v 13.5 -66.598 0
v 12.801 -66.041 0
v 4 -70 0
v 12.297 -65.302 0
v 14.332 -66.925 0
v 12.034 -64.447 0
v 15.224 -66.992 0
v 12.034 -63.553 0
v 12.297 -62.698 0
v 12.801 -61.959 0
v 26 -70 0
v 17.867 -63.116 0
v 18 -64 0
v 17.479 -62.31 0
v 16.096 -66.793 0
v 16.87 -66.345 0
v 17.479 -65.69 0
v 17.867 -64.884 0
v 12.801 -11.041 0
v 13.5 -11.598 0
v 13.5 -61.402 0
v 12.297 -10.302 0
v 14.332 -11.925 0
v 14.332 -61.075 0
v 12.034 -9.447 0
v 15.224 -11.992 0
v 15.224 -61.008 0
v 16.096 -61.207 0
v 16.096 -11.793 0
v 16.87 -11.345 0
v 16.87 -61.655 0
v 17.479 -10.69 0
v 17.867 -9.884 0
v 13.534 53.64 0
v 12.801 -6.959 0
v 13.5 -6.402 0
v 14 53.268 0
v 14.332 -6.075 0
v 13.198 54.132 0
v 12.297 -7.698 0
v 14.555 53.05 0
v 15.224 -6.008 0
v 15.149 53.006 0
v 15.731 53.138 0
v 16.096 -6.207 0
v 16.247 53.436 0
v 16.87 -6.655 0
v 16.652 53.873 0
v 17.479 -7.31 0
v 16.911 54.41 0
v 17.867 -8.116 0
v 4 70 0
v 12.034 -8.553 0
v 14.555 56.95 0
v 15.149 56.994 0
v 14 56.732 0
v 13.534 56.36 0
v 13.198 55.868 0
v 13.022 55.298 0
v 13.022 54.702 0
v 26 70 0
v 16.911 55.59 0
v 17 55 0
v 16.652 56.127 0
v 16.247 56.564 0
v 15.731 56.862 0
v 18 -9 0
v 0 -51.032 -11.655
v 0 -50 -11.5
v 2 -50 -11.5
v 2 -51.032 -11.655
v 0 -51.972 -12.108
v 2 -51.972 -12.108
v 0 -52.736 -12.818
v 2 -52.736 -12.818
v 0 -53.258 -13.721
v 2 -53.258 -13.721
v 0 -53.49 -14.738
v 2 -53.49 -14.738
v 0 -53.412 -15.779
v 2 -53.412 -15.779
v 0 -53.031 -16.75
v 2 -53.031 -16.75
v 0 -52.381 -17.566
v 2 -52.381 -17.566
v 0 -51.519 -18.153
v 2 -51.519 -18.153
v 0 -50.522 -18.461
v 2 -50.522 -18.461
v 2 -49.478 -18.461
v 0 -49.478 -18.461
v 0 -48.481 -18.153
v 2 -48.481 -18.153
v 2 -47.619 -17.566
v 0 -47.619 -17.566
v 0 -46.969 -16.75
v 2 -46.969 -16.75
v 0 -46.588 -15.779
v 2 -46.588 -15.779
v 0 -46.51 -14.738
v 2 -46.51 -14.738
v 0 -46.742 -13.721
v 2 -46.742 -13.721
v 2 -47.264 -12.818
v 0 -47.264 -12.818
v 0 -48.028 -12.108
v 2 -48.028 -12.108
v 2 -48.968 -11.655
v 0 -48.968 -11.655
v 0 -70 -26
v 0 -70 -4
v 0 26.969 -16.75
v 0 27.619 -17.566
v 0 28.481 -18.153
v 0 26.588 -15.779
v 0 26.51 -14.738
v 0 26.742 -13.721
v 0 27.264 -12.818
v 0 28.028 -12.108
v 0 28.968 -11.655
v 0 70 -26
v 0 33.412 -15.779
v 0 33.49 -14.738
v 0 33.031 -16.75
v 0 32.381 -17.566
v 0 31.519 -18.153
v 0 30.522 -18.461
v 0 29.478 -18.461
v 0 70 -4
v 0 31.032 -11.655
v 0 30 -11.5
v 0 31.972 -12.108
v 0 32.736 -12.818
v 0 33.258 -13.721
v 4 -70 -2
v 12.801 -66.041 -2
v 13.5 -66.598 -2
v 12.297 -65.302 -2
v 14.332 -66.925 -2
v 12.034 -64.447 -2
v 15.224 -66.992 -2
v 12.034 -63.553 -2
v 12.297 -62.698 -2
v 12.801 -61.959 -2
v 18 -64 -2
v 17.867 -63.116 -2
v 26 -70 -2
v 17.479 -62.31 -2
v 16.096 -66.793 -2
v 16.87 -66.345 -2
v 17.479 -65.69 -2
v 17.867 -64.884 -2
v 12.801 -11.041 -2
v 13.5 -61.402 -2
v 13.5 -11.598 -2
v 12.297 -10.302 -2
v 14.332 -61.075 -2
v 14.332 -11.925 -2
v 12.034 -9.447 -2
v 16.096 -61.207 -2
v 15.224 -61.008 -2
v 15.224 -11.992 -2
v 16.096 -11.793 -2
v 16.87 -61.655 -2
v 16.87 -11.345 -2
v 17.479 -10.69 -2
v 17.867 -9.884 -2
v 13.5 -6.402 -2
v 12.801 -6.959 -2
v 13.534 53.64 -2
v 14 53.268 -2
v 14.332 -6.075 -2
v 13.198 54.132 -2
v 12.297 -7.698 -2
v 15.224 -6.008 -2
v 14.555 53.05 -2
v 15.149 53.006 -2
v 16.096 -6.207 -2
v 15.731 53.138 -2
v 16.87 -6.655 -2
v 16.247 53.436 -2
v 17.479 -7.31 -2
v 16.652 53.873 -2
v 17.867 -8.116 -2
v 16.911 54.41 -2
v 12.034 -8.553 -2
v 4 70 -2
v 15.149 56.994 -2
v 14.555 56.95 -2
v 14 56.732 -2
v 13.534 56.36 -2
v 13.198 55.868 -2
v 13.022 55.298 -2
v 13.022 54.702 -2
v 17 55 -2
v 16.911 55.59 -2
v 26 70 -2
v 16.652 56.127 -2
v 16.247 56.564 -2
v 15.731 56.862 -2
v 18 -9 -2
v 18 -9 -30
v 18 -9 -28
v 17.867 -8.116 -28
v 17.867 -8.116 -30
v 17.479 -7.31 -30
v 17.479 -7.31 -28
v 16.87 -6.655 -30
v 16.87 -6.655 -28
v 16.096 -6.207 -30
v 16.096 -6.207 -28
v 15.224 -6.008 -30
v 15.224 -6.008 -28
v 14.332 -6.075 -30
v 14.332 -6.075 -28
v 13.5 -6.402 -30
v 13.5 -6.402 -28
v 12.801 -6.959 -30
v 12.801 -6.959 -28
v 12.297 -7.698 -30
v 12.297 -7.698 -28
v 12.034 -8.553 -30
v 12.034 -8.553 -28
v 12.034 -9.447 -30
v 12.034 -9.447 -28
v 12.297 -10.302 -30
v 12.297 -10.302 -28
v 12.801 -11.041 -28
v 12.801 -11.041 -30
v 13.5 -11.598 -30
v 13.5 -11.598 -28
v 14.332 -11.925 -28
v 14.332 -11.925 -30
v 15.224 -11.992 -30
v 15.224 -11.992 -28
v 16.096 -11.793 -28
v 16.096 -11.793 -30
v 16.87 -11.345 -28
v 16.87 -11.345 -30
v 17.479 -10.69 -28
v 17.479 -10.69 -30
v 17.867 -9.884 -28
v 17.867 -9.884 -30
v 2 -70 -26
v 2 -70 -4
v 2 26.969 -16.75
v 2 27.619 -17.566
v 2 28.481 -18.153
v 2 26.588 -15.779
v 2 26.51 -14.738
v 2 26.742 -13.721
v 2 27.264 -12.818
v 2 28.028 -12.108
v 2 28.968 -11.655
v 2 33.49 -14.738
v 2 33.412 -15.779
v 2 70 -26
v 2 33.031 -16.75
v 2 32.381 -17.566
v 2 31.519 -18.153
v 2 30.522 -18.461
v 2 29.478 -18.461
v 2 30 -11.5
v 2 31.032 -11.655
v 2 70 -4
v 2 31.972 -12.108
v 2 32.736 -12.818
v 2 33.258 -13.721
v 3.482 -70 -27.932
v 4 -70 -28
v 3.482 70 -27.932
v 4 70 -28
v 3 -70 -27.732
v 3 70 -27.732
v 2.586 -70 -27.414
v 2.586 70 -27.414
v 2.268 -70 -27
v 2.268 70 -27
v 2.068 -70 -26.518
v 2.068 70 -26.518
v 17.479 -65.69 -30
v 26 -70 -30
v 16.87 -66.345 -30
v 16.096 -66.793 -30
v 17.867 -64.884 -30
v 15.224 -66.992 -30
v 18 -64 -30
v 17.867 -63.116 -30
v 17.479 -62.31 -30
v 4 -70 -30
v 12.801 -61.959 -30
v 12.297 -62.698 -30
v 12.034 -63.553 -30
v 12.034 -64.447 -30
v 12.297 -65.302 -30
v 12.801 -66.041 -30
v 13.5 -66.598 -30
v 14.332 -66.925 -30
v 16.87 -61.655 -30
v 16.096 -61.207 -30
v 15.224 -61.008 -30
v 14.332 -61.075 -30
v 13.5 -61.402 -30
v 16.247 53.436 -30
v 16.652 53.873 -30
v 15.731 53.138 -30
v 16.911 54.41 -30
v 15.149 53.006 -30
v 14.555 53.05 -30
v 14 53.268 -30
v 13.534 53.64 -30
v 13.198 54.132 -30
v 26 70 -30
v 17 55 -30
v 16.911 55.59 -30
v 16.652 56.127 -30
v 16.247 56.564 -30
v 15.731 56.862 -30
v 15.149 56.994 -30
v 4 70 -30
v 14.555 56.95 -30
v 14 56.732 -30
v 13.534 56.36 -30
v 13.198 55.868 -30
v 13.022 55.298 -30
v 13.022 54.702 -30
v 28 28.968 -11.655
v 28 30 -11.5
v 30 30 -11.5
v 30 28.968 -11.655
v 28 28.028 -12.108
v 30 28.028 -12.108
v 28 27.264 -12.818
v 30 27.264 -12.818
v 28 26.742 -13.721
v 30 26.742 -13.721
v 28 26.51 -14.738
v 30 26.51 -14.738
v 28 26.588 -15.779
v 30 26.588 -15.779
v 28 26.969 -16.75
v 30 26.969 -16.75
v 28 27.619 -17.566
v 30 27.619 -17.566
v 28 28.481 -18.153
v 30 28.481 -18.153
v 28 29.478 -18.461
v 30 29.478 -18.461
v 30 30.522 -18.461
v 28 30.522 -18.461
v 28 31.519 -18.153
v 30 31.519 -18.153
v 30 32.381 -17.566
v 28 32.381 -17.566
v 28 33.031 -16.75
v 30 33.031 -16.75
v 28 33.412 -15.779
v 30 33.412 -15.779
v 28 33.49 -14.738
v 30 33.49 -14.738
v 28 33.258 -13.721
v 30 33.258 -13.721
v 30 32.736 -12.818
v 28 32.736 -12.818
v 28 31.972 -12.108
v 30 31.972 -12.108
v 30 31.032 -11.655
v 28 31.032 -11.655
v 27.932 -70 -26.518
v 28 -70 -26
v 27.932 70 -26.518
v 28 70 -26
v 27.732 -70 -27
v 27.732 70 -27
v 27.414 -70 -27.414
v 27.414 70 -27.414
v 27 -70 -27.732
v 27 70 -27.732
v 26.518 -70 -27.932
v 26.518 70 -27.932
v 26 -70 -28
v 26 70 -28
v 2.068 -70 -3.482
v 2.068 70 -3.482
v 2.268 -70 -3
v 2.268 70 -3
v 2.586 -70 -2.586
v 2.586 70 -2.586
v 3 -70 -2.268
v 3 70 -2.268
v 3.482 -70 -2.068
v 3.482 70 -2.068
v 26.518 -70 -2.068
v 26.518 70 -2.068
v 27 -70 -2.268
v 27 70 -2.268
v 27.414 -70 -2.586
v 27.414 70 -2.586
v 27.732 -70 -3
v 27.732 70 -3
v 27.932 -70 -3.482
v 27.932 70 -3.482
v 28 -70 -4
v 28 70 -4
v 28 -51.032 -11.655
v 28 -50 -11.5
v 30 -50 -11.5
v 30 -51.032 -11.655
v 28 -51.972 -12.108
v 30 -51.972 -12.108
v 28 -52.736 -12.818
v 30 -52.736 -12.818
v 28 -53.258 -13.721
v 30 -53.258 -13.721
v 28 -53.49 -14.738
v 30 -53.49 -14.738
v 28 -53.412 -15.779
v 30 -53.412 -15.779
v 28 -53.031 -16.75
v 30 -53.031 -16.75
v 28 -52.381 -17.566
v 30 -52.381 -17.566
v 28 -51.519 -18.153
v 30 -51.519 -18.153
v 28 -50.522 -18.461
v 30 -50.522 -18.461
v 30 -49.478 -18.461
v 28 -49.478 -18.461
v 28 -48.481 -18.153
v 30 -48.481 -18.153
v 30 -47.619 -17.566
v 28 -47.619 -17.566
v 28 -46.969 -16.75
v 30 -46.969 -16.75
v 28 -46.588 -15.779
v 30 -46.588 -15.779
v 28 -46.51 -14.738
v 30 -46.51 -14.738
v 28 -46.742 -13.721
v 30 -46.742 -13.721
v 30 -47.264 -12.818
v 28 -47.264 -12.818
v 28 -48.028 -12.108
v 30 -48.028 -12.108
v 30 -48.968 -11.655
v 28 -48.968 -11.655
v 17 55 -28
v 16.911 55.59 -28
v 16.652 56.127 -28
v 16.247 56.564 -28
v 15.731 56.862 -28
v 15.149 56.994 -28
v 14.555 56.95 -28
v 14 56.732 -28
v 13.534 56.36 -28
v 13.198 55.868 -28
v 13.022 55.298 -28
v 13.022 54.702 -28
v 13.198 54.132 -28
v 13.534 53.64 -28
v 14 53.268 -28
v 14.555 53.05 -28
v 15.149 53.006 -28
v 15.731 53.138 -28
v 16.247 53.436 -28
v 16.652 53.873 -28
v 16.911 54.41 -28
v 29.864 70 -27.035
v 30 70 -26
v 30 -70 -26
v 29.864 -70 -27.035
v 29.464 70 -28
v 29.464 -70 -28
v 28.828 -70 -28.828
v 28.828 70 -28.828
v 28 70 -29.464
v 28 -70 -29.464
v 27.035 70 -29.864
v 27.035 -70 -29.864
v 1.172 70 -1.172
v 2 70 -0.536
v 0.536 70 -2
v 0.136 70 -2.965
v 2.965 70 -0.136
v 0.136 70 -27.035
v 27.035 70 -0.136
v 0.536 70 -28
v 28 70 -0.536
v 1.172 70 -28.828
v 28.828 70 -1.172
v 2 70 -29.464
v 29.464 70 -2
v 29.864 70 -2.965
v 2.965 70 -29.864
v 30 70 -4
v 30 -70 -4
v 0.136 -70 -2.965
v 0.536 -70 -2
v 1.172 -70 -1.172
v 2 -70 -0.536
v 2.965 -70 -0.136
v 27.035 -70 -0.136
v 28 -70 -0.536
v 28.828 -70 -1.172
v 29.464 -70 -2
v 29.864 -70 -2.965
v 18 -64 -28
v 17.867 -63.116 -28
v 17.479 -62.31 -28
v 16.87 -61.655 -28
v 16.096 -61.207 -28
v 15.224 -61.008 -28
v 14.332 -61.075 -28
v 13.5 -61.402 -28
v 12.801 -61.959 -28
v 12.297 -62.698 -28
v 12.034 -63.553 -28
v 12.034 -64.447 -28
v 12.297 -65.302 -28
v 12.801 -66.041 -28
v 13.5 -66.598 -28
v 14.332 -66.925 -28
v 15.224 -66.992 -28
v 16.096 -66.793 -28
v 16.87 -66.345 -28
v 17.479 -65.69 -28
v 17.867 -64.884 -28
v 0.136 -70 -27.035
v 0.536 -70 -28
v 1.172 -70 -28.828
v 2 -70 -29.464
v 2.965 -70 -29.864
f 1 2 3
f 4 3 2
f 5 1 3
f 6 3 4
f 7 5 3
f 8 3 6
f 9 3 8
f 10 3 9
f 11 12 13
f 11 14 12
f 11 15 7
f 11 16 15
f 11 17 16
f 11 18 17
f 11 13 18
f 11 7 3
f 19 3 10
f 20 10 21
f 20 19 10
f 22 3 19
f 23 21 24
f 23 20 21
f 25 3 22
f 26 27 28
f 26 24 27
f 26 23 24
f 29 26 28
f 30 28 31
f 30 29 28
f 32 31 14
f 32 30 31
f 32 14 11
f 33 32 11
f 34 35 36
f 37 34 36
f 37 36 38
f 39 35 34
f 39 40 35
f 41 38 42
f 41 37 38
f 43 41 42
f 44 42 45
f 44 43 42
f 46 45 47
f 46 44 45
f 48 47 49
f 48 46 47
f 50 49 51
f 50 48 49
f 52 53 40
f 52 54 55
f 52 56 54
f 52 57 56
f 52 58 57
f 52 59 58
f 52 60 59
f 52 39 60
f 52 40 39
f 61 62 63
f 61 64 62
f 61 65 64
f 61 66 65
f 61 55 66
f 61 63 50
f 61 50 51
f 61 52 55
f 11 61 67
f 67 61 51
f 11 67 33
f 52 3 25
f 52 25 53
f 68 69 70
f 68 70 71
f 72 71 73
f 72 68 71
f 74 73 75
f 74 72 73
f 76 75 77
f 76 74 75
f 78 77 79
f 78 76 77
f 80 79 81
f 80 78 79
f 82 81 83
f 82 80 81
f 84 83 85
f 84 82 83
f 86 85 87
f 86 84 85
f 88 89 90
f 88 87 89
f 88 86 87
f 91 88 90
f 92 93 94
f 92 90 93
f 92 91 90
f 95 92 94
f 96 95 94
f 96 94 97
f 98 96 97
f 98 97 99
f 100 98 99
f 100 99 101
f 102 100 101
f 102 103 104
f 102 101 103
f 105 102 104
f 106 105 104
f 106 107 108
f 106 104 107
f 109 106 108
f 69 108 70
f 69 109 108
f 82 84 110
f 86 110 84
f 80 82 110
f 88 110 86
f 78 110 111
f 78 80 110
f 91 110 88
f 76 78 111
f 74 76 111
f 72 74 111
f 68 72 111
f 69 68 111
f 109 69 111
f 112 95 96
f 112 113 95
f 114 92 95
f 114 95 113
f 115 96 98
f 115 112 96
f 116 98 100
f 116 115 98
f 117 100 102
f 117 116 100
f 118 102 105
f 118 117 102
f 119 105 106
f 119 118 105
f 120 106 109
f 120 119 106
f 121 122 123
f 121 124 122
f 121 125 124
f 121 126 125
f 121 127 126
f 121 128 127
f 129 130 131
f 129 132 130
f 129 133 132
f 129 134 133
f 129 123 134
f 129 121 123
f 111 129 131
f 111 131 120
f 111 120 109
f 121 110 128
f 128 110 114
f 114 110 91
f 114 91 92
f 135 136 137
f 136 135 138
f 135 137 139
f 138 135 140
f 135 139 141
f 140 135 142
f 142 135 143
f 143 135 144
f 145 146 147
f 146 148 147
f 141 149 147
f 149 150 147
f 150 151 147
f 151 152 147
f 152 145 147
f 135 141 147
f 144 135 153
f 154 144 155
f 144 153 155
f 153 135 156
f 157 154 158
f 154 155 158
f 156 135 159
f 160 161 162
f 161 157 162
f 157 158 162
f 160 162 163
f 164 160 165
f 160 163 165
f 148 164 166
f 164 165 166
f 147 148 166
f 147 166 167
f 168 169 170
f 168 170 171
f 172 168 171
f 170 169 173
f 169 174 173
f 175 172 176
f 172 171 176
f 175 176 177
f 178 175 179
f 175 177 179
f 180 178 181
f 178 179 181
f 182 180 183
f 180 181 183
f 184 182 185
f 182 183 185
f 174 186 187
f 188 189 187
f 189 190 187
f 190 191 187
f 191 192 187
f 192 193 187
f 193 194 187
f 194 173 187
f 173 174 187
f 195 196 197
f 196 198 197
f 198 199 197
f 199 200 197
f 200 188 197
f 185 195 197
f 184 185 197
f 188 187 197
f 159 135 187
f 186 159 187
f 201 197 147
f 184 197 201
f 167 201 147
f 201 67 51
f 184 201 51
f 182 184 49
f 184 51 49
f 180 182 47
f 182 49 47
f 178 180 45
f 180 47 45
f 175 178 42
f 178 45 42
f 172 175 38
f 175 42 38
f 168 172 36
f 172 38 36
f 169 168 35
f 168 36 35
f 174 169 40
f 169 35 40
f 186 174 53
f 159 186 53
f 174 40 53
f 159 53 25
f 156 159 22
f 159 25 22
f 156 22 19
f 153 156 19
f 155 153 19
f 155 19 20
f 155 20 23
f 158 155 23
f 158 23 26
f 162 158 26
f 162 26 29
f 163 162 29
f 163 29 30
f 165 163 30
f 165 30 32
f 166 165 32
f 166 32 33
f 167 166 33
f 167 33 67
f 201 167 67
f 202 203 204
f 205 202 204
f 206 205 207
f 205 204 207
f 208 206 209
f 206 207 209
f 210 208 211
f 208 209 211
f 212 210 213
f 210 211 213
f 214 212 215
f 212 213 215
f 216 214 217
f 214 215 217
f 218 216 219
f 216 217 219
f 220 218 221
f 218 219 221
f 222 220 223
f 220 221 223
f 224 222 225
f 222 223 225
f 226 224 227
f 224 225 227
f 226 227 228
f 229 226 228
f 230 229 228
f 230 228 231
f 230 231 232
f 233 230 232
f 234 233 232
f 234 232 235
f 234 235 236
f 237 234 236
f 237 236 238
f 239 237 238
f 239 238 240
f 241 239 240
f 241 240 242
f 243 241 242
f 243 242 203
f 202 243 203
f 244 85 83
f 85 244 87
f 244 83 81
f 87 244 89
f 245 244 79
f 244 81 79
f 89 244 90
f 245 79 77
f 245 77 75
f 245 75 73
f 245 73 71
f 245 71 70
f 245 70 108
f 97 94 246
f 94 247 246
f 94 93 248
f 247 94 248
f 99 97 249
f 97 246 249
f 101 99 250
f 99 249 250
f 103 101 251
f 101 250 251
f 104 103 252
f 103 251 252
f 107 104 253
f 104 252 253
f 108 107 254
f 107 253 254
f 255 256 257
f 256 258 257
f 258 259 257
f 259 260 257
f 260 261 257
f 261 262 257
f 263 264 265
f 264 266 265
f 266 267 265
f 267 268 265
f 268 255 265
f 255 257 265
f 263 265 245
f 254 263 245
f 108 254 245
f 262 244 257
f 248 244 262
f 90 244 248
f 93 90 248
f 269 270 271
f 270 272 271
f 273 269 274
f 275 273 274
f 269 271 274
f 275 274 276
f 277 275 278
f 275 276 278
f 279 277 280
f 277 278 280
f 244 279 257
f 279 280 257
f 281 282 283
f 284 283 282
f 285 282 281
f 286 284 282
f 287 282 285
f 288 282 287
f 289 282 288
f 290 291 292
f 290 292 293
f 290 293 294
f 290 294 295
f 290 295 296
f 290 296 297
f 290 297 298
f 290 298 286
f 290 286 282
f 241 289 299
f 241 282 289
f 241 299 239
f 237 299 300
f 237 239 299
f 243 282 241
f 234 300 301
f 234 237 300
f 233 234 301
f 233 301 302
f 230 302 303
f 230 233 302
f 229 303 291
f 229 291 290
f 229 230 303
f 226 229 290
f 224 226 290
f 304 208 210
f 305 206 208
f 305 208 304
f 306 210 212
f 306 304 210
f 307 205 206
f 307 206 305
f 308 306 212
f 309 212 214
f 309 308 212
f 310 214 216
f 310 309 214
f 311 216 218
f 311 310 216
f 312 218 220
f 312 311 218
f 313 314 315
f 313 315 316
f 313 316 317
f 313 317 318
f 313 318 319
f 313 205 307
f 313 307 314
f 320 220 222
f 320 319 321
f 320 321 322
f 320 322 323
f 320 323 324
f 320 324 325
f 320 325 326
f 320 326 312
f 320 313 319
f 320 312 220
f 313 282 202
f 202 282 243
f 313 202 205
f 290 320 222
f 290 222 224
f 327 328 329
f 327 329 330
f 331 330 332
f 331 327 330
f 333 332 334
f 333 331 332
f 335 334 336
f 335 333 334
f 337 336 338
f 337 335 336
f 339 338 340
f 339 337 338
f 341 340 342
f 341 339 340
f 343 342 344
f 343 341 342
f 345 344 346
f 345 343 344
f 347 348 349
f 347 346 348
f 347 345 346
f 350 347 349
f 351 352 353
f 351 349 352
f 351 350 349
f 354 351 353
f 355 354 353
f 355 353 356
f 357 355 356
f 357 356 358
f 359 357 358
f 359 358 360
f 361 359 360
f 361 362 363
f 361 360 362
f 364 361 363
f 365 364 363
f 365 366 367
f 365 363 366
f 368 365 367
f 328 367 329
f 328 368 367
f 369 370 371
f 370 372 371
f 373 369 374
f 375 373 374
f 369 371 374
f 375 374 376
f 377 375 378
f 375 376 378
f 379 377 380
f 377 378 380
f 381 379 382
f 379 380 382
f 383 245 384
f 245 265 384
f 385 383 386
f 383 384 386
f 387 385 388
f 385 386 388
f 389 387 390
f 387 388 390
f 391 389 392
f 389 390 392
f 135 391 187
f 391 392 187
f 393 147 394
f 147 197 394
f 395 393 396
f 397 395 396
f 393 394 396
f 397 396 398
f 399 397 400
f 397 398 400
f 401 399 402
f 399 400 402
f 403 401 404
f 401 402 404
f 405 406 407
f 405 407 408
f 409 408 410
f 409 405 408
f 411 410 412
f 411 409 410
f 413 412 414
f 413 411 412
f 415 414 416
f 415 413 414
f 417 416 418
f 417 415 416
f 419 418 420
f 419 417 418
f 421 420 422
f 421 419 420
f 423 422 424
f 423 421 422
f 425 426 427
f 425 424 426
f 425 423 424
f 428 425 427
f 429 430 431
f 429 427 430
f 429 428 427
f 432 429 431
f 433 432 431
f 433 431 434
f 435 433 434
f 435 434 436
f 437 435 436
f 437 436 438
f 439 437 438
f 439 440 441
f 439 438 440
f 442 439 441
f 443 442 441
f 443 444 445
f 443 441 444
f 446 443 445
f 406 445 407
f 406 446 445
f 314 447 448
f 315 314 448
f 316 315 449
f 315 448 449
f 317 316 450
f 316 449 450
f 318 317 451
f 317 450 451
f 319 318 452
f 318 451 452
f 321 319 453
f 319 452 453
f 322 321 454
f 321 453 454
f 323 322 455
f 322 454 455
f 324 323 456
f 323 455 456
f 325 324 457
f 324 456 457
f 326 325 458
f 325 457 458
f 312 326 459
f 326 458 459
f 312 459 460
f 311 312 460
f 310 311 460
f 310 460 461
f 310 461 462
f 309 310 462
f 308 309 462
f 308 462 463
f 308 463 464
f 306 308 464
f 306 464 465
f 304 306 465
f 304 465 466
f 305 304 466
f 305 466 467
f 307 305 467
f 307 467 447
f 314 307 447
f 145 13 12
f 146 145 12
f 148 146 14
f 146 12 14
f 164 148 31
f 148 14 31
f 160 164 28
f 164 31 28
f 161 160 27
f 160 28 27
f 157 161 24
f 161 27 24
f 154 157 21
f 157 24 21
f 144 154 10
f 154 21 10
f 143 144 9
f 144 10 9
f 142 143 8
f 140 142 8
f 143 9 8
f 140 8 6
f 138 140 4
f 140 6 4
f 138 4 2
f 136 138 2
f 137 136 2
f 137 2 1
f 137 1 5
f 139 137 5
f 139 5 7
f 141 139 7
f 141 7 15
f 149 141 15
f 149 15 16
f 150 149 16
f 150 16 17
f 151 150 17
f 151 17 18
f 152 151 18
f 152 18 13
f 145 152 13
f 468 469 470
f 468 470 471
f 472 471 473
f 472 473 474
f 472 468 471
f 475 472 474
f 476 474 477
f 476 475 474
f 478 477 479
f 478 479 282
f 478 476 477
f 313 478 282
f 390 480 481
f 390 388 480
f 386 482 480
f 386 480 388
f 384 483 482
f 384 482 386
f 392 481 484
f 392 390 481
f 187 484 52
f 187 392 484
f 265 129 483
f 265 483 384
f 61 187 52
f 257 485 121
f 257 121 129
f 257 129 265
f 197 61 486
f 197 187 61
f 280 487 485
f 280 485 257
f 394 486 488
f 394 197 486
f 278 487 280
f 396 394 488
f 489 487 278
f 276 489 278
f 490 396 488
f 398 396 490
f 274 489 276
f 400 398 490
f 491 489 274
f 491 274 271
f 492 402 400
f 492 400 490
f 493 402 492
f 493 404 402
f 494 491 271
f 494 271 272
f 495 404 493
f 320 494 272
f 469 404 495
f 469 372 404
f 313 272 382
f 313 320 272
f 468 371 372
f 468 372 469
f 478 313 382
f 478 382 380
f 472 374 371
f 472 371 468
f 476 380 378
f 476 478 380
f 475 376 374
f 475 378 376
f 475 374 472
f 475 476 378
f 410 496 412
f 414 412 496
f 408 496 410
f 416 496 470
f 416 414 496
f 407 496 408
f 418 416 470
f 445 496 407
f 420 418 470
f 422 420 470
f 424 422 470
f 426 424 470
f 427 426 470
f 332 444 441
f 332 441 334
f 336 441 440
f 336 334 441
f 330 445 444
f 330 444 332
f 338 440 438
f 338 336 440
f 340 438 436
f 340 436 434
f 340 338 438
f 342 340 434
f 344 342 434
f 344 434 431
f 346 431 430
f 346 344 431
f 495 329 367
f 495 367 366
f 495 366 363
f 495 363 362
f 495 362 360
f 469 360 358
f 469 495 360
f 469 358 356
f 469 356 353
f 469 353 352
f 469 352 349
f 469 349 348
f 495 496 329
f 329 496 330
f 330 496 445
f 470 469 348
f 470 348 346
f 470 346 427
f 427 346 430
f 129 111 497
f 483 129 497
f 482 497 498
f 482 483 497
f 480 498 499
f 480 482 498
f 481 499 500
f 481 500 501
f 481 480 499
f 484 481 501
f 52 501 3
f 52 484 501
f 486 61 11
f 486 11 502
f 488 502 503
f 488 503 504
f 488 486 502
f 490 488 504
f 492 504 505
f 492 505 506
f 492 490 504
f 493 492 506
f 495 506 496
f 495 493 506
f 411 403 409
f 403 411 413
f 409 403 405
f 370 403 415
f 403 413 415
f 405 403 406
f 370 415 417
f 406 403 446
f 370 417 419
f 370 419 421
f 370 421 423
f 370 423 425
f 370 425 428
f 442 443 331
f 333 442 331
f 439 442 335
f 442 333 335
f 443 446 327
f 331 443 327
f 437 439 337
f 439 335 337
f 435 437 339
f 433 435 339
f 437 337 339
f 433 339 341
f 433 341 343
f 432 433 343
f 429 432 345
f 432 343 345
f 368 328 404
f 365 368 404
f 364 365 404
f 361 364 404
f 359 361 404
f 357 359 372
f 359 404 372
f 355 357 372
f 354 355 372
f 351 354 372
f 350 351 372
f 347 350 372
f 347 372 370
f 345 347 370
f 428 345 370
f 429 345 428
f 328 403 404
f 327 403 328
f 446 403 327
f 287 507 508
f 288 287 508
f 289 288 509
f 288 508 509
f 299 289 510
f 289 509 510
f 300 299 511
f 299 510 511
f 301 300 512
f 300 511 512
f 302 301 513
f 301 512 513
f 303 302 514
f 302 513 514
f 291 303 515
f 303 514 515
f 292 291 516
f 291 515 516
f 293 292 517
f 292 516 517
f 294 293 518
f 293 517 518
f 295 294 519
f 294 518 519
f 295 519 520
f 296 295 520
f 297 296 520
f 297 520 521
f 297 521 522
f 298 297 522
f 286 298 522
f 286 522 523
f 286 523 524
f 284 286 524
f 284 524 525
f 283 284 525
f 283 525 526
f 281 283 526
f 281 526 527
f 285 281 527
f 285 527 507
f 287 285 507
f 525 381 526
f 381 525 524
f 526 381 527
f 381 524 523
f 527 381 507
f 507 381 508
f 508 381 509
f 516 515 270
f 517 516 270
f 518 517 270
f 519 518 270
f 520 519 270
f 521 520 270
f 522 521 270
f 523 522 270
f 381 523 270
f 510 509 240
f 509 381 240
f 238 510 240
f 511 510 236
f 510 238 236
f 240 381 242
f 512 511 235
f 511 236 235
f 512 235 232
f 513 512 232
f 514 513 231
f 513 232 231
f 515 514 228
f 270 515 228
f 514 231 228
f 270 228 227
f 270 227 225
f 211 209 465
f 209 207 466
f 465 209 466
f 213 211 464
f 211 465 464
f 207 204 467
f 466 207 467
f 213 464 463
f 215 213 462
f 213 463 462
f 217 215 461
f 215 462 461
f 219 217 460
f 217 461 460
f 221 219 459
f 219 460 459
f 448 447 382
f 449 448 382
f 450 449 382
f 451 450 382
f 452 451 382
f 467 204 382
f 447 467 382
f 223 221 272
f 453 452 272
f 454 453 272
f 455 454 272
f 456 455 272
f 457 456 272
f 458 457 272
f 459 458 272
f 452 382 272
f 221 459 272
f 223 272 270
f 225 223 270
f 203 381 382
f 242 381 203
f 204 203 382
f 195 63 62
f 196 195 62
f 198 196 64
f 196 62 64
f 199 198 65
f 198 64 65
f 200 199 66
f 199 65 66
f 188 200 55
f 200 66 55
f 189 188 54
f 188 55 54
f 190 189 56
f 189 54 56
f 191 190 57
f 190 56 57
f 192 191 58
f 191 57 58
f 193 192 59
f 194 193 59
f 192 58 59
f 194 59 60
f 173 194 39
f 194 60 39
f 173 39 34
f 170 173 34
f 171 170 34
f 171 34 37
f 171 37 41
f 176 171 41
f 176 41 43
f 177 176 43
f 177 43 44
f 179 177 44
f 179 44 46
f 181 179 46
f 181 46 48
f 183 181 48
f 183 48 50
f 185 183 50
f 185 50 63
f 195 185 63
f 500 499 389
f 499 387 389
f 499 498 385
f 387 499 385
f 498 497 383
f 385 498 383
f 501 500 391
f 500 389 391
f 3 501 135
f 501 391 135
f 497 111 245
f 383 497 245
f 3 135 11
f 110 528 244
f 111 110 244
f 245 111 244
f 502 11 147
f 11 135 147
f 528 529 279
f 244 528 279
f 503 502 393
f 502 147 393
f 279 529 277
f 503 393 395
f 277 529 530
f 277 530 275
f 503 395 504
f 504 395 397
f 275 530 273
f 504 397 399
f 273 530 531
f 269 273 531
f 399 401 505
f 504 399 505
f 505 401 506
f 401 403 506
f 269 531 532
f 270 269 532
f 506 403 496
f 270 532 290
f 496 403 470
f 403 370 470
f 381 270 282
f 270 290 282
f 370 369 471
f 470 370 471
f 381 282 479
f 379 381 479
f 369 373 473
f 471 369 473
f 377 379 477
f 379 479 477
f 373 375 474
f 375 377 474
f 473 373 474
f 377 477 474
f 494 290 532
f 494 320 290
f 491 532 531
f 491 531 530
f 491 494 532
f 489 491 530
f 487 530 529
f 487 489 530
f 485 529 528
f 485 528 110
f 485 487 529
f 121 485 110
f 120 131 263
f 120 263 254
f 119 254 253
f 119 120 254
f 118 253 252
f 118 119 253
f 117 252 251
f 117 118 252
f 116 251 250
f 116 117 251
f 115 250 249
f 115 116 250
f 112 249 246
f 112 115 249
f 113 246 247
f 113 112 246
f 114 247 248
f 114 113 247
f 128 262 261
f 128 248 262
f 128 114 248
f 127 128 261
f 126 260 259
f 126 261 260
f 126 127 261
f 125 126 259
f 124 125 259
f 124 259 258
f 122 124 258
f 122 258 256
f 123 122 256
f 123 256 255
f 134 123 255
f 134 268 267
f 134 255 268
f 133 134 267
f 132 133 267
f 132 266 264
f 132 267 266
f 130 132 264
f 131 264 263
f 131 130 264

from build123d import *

# Parameters (mm, degrees)
EXTRUDE_1_DEPTH          = 70
SKETCH_3_R               = 3
SKETCH_3_R_2             = 2
CUT_EXTRUDE_1_DEPTH      = 82.853527719
CUT_EXTRUDE_2_DEPTH      = 82.853527719
CUT_EXTRUDE_2_DEPTH_BACK = 82.853527719
SKETCH_4_R               = 3.5


with BuildPart() as part:
    # 草图2 → 凸台-拉伸1 (new, symmetric)
    with BuildSketch(Plane(origin=(0, 0, 0), x_dir=(1, 0, 0), z_dir=(0, 1, 0))):
        with BuildLine():
            Line((4, 0), (26, 0))
            ThreePointArc((26, 0), (28.828427125, 1.171572875), (30, 4))
            Line((30, 4), (30, 26))
            ThreePointArc((30, 26), (28.828427125, 28.828427125), (26, 30))
            Line((26, 30), (4, 30))
            ThreePointArc((4, 30), (1.171572875, 28.828427125), (0, 26))
            Line((0, 26), (0, 4))
            ThreePointArc((0, 4), (1.171572875, 1.171572875), (4, 0))
        make_face()
        with BuildLine():
            Line((4, 2), (26, 2))
            ThreePointArc((26, 2), (27.414213562, 2.585786438), (28, 4))
            Line((28, 4), (28, 26))
            ThreePointArc((28, 26), (27.414213562, 27.414213562), (26, 28))
            Line((26, 28), (4, 28))
            ThreePointArc((4, 28), (2.585786438, 27.414213562), (2, 26))
            Line((2, 26), (2, 4))
            ThreePointArc((2, 4), (2.585786438, 2.585786438), (4, 2))
        make_face(mode=Mode.SUBTRACT)
    extrude(amount=EXTRUDE_1_DEPTH, both=True)

    # 草图3 → 切除-拉伸1 (cut, through all)
    with BuildSketch(Plane.XY):
        with Locations((15, -64)):
            Circle(SKETCH_3_R)
        with Locations((15, -9)):
            Circle(SKETCH_3_R)
        with Locations((15, 55)):
            Circle(SKETCH_3_R_2)
    extrude(amount=-CUT_EXTRUDE_1_DEPTH, mode=Mode.SUBTRACT)

    # 草图4 → 切除-拉伸2 (cut, two sides: drawn at the far end of the back side and taken through both)
    with BuildSketch(Plane(origin=(0, 0, 0), x_dir=(0, 0, -1), z_dir=(1, 0, 0)).offset(-CUT_EXTRUDE_2_DEPTH_BACK)):
        with Locations(Location((15, -50, 0), (0, 0, 180))):
            Circle(SKETCH_4_R)
        with Locations(Location((15, 30, 0), (0, 0, 180))):
            Circle(SKETCH_4_R)
    extrude(amount=CUT_EXTRUDE_2_DEPTH + CUT_EXTRUDE_2_DEPTH_BACK, mode=Mode.SUBTRACT)


solid = part.part
